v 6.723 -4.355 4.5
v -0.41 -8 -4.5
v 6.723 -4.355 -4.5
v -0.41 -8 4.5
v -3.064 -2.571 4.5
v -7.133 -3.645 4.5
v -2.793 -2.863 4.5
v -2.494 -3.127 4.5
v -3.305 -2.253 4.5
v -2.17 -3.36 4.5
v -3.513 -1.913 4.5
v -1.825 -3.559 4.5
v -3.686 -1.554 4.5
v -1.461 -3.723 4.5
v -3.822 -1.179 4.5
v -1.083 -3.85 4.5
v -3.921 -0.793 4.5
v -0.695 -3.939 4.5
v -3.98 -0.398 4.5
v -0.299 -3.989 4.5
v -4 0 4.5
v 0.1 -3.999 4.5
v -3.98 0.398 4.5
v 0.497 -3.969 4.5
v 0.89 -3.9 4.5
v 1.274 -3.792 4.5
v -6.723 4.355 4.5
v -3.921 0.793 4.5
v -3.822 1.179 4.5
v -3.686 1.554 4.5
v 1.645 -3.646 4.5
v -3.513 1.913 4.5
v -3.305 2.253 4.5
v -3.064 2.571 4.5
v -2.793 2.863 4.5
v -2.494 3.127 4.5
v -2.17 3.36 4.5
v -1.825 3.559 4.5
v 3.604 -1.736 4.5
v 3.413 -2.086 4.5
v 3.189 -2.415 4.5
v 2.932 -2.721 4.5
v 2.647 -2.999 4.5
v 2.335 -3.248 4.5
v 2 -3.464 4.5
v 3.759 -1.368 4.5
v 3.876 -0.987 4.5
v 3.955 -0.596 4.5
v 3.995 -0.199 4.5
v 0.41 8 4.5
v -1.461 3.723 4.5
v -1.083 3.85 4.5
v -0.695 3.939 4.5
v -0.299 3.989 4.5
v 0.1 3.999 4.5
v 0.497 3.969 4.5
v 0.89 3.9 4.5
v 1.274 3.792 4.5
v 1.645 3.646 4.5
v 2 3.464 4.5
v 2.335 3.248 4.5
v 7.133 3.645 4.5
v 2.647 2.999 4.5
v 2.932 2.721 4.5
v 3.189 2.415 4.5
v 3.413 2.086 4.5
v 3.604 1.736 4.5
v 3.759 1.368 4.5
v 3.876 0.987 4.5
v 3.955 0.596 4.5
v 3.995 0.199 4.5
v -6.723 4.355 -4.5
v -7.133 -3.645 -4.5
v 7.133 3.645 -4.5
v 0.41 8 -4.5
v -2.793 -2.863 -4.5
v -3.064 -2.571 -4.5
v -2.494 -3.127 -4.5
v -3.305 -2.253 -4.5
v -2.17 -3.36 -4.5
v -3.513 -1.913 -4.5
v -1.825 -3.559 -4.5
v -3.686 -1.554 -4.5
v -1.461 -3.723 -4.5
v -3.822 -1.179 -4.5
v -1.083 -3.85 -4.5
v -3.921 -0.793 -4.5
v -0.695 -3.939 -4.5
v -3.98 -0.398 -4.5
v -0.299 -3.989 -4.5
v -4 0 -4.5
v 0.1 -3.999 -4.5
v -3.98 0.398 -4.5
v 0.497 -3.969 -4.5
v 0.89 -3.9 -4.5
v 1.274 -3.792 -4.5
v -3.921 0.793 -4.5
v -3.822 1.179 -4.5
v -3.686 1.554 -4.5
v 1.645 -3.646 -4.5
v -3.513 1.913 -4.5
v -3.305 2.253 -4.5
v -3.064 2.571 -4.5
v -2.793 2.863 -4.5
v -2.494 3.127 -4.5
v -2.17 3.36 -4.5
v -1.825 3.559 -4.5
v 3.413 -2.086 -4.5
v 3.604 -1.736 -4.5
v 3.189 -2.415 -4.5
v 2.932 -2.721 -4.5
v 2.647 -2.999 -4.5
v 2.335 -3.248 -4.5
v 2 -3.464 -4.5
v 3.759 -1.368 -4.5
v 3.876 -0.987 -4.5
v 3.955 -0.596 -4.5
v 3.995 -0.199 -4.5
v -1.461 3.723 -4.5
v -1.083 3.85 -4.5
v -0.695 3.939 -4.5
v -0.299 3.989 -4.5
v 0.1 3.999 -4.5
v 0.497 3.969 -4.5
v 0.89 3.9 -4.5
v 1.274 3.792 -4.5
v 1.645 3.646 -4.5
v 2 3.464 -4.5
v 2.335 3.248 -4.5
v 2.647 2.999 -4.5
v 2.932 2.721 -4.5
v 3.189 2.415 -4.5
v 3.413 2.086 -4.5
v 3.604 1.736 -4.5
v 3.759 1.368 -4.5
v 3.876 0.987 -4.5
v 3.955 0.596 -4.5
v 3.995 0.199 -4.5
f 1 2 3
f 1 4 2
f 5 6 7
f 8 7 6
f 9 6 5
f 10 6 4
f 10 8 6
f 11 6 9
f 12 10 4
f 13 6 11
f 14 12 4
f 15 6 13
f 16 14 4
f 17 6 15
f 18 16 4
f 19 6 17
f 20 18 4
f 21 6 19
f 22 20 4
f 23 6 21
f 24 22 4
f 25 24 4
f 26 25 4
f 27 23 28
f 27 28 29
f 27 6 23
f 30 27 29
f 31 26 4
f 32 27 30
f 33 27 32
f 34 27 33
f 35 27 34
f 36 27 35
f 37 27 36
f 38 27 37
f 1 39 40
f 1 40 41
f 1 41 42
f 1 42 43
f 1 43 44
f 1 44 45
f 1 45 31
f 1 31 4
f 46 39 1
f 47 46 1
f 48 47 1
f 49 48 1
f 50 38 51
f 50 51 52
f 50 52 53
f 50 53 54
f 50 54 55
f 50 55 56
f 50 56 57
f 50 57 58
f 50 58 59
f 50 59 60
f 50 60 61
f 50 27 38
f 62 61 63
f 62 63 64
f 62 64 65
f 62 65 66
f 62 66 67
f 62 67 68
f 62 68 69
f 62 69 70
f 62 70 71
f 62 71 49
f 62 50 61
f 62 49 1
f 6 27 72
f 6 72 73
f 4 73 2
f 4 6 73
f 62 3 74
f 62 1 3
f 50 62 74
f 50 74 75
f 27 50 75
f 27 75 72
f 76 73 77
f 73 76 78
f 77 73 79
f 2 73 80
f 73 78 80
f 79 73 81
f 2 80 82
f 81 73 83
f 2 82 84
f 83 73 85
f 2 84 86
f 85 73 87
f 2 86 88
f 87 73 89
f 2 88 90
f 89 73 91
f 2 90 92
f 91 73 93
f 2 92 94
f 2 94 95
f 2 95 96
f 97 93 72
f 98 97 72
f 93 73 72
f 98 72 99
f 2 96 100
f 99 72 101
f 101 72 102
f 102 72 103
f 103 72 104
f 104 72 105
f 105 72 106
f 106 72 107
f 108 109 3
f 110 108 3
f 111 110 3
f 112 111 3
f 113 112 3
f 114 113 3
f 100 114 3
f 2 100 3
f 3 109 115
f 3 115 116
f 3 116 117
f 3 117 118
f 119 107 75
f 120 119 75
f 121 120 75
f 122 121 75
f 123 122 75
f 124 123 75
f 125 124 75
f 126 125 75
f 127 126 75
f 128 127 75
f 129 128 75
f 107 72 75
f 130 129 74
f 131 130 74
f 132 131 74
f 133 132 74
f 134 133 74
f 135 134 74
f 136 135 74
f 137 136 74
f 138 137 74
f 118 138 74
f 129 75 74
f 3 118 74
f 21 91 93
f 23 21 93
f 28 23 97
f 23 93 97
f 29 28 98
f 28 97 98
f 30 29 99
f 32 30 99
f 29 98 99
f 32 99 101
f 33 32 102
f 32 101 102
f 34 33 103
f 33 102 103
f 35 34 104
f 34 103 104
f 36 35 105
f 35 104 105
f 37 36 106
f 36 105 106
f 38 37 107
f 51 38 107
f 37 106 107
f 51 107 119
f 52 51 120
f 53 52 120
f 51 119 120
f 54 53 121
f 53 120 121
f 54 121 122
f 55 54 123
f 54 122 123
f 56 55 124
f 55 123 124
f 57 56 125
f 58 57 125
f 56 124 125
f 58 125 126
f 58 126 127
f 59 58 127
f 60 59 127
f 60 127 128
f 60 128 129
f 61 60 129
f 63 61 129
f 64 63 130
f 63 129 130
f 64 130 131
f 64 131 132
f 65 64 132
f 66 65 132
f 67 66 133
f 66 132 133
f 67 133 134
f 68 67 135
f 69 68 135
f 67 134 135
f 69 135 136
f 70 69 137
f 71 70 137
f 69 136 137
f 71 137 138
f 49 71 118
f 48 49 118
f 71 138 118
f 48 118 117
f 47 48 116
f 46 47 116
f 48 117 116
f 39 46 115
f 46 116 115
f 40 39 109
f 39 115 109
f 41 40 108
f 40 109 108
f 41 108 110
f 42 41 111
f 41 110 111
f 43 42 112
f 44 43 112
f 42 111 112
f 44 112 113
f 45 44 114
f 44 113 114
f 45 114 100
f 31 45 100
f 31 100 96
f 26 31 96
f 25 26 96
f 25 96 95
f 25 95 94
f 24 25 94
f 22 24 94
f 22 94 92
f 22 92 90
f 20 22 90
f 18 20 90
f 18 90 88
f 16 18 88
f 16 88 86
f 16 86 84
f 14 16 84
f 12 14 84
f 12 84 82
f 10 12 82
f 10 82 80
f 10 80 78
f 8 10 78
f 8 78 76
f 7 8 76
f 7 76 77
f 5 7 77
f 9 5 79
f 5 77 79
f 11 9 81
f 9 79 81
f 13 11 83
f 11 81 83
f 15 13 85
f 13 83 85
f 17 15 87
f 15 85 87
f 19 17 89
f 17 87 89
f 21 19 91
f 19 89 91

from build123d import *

# Parameters (mm, degrees)
BOSS_EXTRUDE1_DEPTH = 4.5
SKETCH2_R           = 4
CUT_EXTRUDE1_DEPTH  = 9


with BuildPart() as part:
    # Sketch1 → Boss-Extrude1 (new body, symmetric)
    with BuildSketch(Plane.XY):
        Polygon((6.723407542, -4.354716537), (7.132998919, 3.645283463), (0.409591377, 8), (-6.723407542, 4.354716537), (-7.132998919, -3.645283463), (-0.409591377, -8), align=None)
    extrude(amount=BOSS_EXTRUDE1_DEPTH, both=True)

    # Sketch2 → Cut-Extrude1 (cut)
    with BuildSketch(Plane(origin=(0, 0, -4.5), x_dir=(-1, 0, 0), z_dir=(0, 0, -1))):
        Circle(SKETCH2_R)
    extrude(amount=-CUT_EXTRUDE1_DEPTH, mode=Mode.SUBTRACT)


solid = part.part
